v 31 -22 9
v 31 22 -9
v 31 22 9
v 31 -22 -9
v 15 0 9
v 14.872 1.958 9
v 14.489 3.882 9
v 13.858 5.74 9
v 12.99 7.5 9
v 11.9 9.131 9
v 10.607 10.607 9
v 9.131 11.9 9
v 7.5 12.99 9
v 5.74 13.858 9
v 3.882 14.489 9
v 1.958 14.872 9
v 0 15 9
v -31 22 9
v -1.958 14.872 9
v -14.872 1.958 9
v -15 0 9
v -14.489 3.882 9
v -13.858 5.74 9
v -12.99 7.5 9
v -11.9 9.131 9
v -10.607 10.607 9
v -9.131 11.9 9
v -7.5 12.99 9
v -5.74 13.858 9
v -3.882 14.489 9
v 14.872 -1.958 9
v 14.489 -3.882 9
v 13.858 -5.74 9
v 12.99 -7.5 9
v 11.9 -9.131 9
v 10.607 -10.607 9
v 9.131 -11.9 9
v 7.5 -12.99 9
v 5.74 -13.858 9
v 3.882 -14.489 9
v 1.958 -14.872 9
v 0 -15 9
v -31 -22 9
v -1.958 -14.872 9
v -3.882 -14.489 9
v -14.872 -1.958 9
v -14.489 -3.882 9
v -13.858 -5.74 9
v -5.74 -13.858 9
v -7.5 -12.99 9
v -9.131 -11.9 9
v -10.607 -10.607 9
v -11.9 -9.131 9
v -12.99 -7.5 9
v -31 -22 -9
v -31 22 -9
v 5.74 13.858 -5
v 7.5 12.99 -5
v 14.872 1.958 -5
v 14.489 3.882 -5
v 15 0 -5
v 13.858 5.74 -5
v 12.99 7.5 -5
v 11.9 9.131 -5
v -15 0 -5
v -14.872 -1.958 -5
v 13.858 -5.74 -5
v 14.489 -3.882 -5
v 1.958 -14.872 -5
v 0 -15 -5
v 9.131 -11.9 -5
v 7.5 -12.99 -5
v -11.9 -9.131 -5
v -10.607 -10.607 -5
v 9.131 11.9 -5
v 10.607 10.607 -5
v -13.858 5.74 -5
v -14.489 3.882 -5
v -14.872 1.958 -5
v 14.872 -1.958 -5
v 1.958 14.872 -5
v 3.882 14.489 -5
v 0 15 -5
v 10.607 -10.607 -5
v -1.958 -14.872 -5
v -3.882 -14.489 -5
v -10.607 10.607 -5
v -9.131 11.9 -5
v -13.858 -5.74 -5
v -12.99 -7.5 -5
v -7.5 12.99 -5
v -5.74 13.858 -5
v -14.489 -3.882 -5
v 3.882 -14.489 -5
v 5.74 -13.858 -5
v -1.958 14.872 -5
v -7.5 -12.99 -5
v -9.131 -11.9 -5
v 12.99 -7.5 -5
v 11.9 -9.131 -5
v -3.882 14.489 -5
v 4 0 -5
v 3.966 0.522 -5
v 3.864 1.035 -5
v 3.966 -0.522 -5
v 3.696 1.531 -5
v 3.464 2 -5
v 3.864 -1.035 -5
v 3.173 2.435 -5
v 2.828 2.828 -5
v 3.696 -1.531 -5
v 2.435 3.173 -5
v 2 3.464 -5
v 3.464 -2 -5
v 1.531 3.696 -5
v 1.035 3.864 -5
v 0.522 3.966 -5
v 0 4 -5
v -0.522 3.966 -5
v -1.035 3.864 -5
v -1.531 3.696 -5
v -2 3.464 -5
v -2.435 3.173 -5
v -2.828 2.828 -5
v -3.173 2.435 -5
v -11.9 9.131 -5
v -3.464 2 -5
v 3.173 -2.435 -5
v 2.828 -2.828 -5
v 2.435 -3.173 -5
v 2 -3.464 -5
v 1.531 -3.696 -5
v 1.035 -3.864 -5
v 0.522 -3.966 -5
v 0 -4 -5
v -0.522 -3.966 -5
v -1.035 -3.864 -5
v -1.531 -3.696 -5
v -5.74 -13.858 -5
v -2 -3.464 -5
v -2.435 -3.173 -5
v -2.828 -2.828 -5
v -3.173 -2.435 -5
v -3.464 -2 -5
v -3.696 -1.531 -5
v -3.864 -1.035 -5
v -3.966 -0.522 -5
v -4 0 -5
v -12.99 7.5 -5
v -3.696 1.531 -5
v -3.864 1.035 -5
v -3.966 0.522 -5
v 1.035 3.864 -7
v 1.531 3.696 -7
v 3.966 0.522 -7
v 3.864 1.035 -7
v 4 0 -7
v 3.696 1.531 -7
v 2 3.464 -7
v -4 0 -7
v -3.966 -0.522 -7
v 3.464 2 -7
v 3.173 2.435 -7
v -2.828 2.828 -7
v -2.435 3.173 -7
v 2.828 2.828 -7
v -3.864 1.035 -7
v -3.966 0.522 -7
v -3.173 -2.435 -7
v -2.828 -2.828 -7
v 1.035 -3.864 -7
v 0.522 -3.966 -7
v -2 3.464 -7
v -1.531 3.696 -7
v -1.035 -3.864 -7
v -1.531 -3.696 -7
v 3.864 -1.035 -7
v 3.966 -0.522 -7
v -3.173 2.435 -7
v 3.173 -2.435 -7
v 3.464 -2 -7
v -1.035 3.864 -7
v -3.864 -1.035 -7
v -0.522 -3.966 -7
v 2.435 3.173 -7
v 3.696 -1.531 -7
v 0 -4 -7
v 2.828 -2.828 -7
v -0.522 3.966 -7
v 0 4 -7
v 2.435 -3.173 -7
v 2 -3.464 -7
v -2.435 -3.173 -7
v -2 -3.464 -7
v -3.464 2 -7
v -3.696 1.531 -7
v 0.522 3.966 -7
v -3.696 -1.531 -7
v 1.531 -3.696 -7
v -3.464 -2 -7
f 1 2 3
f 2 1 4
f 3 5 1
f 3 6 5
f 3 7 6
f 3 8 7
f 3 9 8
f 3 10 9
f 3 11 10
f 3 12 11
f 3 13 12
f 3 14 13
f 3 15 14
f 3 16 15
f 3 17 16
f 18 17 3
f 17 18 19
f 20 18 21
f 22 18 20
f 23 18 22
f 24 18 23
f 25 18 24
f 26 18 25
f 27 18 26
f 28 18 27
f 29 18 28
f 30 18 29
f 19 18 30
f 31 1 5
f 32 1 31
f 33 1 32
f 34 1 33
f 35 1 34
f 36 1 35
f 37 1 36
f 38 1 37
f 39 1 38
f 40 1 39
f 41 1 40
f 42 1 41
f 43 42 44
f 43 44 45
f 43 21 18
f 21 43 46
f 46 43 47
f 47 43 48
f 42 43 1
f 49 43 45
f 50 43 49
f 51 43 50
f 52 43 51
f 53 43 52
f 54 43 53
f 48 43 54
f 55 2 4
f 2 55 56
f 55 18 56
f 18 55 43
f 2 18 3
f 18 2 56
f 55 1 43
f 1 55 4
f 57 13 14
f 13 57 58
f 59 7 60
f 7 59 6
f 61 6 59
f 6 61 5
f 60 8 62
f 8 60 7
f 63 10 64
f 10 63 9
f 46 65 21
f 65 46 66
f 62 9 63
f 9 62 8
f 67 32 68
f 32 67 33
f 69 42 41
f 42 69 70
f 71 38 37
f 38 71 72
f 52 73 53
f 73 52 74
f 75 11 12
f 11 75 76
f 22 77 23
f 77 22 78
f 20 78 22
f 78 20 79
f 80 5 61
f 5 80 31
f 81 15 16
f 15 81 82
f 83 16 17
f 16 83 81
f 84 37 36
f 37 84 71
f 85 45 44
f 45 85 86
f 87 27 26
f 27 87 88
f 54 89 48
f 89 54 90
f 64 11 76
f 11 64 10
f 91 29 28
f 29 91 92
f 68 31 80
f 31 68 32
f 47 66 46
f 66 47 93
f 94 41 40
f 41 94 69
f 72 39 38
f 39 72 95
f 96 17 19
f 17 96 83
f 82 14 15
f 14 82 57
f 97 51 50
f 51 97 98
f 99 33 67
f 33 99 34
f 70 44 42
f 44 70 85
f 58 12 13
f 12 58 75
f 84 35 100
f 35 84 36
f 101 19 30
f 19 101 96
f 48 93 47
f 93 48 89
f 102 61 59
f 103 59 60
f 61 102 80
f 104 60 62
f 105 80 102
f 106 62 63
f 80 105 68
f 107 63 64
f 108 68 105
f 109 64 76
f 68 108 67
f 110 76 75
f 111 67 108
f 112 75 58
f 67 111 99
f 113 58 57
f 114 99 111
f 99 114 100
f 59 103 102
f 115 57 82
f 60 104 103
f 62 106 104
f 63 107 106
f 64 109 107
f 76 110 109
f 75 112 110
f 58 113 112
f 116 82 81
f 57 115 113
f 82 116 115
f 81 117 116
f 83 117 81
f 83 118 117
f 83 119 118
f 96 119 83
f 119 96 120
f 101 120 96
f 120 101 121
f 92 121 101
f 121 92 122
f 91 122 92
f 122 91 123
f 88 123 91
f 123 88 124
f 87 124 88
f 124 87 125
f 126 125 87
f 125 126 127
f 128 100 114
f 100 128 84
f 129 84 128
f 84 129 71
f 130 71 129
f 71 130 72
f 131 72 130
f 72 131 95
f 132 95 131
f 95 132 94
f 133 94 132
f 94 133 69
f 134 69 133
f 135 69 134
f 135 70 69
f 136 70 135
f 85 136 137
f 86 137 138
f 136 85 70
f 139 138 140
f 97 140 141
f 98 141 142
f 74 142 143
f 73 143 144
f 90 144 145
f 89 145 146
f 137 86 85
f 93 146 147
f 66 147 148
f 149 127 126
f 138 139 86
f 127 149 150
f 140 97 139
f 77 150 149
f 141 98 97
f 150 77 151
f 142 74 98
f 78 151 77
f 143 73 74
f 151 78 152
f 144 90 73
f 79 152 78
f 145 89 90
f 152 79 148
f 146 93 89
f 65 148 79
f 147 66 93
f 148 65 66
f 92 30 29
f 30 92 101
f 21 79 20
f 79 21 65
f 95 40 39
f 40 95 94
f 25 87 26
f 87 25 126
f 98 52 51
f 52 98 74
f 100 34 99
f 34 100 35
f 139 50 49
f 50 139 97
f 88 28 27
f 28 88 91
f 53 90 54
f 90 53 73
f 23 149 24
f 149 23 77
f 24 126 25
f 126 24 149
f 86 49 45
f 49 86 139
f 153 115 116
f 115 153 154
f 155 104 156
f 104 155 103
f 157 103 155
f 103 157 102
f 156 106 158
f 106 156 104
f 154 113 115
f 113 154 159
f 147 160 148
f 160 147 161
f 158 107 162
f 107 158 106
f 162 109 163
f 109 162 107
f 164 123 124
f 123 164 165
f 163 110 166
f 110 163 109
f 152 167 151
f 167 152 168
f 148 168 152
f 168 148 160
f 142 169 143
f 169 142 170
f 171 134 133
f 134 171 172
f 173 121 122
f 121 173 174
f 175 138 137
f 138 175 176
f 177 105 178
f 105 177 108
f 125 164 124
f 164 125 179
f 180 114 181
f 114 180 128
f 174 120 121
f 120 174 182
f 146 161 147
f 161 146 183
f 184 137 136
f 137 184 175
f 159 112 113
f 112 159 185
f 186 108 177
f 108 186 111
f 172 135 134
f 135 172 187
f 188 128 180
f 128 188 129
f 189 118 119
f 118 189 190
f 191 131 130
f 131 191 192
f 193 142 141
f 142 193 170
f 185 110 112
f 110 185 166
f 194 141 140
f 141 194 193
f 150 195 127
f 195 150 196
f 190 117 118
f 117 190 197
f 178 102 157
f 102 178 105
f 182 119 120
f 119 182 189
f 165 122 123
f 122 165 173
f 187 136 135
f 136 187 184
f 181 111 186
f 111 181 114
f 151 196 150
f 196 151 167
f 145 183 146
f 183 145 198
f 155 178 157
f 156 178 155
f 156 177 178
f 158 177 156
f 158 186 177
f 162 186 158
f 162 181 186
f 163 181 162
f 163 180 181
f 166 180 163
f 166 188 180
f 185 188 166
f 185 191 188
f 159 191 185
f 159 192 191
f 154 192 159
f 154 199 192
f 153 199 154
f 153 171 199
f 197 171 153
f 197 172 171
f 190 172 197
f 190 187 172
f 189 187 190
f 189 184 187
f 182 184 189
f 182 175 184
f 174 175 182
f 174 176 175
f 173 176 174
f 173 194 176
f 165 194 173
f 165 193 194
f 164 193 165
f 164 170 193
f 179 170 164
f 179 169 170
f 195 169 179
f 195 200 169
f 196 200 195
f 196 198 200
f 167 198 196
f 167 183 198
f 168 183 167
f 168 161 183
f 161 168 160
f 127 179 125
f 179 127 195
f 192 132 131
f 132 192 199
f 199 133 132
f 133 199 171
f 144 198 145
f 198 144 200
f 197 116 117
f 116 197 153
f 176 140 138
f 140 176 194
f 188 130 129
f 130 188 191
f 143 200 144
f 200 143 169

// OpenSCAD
// Droplet pump mount - printable in PETG
$fn = 48;

mount_width = 62;
mount_depth = 44;
mount_height = 18;

difference() {
    cube([mount_width, mount_depth, mount_height], center = true);
    translate([0, 0, 4])
        cylinder(h = mount_height, d = 30, center = true);
    translate([0, 0, -2])
        cylinder(h = 10, d = 8, center = true);
}

for (x = [-24, 24]) {
    translate([x, 16, 0])
        cylinder(h = mount_height, d = 4.2, center = true);
}
